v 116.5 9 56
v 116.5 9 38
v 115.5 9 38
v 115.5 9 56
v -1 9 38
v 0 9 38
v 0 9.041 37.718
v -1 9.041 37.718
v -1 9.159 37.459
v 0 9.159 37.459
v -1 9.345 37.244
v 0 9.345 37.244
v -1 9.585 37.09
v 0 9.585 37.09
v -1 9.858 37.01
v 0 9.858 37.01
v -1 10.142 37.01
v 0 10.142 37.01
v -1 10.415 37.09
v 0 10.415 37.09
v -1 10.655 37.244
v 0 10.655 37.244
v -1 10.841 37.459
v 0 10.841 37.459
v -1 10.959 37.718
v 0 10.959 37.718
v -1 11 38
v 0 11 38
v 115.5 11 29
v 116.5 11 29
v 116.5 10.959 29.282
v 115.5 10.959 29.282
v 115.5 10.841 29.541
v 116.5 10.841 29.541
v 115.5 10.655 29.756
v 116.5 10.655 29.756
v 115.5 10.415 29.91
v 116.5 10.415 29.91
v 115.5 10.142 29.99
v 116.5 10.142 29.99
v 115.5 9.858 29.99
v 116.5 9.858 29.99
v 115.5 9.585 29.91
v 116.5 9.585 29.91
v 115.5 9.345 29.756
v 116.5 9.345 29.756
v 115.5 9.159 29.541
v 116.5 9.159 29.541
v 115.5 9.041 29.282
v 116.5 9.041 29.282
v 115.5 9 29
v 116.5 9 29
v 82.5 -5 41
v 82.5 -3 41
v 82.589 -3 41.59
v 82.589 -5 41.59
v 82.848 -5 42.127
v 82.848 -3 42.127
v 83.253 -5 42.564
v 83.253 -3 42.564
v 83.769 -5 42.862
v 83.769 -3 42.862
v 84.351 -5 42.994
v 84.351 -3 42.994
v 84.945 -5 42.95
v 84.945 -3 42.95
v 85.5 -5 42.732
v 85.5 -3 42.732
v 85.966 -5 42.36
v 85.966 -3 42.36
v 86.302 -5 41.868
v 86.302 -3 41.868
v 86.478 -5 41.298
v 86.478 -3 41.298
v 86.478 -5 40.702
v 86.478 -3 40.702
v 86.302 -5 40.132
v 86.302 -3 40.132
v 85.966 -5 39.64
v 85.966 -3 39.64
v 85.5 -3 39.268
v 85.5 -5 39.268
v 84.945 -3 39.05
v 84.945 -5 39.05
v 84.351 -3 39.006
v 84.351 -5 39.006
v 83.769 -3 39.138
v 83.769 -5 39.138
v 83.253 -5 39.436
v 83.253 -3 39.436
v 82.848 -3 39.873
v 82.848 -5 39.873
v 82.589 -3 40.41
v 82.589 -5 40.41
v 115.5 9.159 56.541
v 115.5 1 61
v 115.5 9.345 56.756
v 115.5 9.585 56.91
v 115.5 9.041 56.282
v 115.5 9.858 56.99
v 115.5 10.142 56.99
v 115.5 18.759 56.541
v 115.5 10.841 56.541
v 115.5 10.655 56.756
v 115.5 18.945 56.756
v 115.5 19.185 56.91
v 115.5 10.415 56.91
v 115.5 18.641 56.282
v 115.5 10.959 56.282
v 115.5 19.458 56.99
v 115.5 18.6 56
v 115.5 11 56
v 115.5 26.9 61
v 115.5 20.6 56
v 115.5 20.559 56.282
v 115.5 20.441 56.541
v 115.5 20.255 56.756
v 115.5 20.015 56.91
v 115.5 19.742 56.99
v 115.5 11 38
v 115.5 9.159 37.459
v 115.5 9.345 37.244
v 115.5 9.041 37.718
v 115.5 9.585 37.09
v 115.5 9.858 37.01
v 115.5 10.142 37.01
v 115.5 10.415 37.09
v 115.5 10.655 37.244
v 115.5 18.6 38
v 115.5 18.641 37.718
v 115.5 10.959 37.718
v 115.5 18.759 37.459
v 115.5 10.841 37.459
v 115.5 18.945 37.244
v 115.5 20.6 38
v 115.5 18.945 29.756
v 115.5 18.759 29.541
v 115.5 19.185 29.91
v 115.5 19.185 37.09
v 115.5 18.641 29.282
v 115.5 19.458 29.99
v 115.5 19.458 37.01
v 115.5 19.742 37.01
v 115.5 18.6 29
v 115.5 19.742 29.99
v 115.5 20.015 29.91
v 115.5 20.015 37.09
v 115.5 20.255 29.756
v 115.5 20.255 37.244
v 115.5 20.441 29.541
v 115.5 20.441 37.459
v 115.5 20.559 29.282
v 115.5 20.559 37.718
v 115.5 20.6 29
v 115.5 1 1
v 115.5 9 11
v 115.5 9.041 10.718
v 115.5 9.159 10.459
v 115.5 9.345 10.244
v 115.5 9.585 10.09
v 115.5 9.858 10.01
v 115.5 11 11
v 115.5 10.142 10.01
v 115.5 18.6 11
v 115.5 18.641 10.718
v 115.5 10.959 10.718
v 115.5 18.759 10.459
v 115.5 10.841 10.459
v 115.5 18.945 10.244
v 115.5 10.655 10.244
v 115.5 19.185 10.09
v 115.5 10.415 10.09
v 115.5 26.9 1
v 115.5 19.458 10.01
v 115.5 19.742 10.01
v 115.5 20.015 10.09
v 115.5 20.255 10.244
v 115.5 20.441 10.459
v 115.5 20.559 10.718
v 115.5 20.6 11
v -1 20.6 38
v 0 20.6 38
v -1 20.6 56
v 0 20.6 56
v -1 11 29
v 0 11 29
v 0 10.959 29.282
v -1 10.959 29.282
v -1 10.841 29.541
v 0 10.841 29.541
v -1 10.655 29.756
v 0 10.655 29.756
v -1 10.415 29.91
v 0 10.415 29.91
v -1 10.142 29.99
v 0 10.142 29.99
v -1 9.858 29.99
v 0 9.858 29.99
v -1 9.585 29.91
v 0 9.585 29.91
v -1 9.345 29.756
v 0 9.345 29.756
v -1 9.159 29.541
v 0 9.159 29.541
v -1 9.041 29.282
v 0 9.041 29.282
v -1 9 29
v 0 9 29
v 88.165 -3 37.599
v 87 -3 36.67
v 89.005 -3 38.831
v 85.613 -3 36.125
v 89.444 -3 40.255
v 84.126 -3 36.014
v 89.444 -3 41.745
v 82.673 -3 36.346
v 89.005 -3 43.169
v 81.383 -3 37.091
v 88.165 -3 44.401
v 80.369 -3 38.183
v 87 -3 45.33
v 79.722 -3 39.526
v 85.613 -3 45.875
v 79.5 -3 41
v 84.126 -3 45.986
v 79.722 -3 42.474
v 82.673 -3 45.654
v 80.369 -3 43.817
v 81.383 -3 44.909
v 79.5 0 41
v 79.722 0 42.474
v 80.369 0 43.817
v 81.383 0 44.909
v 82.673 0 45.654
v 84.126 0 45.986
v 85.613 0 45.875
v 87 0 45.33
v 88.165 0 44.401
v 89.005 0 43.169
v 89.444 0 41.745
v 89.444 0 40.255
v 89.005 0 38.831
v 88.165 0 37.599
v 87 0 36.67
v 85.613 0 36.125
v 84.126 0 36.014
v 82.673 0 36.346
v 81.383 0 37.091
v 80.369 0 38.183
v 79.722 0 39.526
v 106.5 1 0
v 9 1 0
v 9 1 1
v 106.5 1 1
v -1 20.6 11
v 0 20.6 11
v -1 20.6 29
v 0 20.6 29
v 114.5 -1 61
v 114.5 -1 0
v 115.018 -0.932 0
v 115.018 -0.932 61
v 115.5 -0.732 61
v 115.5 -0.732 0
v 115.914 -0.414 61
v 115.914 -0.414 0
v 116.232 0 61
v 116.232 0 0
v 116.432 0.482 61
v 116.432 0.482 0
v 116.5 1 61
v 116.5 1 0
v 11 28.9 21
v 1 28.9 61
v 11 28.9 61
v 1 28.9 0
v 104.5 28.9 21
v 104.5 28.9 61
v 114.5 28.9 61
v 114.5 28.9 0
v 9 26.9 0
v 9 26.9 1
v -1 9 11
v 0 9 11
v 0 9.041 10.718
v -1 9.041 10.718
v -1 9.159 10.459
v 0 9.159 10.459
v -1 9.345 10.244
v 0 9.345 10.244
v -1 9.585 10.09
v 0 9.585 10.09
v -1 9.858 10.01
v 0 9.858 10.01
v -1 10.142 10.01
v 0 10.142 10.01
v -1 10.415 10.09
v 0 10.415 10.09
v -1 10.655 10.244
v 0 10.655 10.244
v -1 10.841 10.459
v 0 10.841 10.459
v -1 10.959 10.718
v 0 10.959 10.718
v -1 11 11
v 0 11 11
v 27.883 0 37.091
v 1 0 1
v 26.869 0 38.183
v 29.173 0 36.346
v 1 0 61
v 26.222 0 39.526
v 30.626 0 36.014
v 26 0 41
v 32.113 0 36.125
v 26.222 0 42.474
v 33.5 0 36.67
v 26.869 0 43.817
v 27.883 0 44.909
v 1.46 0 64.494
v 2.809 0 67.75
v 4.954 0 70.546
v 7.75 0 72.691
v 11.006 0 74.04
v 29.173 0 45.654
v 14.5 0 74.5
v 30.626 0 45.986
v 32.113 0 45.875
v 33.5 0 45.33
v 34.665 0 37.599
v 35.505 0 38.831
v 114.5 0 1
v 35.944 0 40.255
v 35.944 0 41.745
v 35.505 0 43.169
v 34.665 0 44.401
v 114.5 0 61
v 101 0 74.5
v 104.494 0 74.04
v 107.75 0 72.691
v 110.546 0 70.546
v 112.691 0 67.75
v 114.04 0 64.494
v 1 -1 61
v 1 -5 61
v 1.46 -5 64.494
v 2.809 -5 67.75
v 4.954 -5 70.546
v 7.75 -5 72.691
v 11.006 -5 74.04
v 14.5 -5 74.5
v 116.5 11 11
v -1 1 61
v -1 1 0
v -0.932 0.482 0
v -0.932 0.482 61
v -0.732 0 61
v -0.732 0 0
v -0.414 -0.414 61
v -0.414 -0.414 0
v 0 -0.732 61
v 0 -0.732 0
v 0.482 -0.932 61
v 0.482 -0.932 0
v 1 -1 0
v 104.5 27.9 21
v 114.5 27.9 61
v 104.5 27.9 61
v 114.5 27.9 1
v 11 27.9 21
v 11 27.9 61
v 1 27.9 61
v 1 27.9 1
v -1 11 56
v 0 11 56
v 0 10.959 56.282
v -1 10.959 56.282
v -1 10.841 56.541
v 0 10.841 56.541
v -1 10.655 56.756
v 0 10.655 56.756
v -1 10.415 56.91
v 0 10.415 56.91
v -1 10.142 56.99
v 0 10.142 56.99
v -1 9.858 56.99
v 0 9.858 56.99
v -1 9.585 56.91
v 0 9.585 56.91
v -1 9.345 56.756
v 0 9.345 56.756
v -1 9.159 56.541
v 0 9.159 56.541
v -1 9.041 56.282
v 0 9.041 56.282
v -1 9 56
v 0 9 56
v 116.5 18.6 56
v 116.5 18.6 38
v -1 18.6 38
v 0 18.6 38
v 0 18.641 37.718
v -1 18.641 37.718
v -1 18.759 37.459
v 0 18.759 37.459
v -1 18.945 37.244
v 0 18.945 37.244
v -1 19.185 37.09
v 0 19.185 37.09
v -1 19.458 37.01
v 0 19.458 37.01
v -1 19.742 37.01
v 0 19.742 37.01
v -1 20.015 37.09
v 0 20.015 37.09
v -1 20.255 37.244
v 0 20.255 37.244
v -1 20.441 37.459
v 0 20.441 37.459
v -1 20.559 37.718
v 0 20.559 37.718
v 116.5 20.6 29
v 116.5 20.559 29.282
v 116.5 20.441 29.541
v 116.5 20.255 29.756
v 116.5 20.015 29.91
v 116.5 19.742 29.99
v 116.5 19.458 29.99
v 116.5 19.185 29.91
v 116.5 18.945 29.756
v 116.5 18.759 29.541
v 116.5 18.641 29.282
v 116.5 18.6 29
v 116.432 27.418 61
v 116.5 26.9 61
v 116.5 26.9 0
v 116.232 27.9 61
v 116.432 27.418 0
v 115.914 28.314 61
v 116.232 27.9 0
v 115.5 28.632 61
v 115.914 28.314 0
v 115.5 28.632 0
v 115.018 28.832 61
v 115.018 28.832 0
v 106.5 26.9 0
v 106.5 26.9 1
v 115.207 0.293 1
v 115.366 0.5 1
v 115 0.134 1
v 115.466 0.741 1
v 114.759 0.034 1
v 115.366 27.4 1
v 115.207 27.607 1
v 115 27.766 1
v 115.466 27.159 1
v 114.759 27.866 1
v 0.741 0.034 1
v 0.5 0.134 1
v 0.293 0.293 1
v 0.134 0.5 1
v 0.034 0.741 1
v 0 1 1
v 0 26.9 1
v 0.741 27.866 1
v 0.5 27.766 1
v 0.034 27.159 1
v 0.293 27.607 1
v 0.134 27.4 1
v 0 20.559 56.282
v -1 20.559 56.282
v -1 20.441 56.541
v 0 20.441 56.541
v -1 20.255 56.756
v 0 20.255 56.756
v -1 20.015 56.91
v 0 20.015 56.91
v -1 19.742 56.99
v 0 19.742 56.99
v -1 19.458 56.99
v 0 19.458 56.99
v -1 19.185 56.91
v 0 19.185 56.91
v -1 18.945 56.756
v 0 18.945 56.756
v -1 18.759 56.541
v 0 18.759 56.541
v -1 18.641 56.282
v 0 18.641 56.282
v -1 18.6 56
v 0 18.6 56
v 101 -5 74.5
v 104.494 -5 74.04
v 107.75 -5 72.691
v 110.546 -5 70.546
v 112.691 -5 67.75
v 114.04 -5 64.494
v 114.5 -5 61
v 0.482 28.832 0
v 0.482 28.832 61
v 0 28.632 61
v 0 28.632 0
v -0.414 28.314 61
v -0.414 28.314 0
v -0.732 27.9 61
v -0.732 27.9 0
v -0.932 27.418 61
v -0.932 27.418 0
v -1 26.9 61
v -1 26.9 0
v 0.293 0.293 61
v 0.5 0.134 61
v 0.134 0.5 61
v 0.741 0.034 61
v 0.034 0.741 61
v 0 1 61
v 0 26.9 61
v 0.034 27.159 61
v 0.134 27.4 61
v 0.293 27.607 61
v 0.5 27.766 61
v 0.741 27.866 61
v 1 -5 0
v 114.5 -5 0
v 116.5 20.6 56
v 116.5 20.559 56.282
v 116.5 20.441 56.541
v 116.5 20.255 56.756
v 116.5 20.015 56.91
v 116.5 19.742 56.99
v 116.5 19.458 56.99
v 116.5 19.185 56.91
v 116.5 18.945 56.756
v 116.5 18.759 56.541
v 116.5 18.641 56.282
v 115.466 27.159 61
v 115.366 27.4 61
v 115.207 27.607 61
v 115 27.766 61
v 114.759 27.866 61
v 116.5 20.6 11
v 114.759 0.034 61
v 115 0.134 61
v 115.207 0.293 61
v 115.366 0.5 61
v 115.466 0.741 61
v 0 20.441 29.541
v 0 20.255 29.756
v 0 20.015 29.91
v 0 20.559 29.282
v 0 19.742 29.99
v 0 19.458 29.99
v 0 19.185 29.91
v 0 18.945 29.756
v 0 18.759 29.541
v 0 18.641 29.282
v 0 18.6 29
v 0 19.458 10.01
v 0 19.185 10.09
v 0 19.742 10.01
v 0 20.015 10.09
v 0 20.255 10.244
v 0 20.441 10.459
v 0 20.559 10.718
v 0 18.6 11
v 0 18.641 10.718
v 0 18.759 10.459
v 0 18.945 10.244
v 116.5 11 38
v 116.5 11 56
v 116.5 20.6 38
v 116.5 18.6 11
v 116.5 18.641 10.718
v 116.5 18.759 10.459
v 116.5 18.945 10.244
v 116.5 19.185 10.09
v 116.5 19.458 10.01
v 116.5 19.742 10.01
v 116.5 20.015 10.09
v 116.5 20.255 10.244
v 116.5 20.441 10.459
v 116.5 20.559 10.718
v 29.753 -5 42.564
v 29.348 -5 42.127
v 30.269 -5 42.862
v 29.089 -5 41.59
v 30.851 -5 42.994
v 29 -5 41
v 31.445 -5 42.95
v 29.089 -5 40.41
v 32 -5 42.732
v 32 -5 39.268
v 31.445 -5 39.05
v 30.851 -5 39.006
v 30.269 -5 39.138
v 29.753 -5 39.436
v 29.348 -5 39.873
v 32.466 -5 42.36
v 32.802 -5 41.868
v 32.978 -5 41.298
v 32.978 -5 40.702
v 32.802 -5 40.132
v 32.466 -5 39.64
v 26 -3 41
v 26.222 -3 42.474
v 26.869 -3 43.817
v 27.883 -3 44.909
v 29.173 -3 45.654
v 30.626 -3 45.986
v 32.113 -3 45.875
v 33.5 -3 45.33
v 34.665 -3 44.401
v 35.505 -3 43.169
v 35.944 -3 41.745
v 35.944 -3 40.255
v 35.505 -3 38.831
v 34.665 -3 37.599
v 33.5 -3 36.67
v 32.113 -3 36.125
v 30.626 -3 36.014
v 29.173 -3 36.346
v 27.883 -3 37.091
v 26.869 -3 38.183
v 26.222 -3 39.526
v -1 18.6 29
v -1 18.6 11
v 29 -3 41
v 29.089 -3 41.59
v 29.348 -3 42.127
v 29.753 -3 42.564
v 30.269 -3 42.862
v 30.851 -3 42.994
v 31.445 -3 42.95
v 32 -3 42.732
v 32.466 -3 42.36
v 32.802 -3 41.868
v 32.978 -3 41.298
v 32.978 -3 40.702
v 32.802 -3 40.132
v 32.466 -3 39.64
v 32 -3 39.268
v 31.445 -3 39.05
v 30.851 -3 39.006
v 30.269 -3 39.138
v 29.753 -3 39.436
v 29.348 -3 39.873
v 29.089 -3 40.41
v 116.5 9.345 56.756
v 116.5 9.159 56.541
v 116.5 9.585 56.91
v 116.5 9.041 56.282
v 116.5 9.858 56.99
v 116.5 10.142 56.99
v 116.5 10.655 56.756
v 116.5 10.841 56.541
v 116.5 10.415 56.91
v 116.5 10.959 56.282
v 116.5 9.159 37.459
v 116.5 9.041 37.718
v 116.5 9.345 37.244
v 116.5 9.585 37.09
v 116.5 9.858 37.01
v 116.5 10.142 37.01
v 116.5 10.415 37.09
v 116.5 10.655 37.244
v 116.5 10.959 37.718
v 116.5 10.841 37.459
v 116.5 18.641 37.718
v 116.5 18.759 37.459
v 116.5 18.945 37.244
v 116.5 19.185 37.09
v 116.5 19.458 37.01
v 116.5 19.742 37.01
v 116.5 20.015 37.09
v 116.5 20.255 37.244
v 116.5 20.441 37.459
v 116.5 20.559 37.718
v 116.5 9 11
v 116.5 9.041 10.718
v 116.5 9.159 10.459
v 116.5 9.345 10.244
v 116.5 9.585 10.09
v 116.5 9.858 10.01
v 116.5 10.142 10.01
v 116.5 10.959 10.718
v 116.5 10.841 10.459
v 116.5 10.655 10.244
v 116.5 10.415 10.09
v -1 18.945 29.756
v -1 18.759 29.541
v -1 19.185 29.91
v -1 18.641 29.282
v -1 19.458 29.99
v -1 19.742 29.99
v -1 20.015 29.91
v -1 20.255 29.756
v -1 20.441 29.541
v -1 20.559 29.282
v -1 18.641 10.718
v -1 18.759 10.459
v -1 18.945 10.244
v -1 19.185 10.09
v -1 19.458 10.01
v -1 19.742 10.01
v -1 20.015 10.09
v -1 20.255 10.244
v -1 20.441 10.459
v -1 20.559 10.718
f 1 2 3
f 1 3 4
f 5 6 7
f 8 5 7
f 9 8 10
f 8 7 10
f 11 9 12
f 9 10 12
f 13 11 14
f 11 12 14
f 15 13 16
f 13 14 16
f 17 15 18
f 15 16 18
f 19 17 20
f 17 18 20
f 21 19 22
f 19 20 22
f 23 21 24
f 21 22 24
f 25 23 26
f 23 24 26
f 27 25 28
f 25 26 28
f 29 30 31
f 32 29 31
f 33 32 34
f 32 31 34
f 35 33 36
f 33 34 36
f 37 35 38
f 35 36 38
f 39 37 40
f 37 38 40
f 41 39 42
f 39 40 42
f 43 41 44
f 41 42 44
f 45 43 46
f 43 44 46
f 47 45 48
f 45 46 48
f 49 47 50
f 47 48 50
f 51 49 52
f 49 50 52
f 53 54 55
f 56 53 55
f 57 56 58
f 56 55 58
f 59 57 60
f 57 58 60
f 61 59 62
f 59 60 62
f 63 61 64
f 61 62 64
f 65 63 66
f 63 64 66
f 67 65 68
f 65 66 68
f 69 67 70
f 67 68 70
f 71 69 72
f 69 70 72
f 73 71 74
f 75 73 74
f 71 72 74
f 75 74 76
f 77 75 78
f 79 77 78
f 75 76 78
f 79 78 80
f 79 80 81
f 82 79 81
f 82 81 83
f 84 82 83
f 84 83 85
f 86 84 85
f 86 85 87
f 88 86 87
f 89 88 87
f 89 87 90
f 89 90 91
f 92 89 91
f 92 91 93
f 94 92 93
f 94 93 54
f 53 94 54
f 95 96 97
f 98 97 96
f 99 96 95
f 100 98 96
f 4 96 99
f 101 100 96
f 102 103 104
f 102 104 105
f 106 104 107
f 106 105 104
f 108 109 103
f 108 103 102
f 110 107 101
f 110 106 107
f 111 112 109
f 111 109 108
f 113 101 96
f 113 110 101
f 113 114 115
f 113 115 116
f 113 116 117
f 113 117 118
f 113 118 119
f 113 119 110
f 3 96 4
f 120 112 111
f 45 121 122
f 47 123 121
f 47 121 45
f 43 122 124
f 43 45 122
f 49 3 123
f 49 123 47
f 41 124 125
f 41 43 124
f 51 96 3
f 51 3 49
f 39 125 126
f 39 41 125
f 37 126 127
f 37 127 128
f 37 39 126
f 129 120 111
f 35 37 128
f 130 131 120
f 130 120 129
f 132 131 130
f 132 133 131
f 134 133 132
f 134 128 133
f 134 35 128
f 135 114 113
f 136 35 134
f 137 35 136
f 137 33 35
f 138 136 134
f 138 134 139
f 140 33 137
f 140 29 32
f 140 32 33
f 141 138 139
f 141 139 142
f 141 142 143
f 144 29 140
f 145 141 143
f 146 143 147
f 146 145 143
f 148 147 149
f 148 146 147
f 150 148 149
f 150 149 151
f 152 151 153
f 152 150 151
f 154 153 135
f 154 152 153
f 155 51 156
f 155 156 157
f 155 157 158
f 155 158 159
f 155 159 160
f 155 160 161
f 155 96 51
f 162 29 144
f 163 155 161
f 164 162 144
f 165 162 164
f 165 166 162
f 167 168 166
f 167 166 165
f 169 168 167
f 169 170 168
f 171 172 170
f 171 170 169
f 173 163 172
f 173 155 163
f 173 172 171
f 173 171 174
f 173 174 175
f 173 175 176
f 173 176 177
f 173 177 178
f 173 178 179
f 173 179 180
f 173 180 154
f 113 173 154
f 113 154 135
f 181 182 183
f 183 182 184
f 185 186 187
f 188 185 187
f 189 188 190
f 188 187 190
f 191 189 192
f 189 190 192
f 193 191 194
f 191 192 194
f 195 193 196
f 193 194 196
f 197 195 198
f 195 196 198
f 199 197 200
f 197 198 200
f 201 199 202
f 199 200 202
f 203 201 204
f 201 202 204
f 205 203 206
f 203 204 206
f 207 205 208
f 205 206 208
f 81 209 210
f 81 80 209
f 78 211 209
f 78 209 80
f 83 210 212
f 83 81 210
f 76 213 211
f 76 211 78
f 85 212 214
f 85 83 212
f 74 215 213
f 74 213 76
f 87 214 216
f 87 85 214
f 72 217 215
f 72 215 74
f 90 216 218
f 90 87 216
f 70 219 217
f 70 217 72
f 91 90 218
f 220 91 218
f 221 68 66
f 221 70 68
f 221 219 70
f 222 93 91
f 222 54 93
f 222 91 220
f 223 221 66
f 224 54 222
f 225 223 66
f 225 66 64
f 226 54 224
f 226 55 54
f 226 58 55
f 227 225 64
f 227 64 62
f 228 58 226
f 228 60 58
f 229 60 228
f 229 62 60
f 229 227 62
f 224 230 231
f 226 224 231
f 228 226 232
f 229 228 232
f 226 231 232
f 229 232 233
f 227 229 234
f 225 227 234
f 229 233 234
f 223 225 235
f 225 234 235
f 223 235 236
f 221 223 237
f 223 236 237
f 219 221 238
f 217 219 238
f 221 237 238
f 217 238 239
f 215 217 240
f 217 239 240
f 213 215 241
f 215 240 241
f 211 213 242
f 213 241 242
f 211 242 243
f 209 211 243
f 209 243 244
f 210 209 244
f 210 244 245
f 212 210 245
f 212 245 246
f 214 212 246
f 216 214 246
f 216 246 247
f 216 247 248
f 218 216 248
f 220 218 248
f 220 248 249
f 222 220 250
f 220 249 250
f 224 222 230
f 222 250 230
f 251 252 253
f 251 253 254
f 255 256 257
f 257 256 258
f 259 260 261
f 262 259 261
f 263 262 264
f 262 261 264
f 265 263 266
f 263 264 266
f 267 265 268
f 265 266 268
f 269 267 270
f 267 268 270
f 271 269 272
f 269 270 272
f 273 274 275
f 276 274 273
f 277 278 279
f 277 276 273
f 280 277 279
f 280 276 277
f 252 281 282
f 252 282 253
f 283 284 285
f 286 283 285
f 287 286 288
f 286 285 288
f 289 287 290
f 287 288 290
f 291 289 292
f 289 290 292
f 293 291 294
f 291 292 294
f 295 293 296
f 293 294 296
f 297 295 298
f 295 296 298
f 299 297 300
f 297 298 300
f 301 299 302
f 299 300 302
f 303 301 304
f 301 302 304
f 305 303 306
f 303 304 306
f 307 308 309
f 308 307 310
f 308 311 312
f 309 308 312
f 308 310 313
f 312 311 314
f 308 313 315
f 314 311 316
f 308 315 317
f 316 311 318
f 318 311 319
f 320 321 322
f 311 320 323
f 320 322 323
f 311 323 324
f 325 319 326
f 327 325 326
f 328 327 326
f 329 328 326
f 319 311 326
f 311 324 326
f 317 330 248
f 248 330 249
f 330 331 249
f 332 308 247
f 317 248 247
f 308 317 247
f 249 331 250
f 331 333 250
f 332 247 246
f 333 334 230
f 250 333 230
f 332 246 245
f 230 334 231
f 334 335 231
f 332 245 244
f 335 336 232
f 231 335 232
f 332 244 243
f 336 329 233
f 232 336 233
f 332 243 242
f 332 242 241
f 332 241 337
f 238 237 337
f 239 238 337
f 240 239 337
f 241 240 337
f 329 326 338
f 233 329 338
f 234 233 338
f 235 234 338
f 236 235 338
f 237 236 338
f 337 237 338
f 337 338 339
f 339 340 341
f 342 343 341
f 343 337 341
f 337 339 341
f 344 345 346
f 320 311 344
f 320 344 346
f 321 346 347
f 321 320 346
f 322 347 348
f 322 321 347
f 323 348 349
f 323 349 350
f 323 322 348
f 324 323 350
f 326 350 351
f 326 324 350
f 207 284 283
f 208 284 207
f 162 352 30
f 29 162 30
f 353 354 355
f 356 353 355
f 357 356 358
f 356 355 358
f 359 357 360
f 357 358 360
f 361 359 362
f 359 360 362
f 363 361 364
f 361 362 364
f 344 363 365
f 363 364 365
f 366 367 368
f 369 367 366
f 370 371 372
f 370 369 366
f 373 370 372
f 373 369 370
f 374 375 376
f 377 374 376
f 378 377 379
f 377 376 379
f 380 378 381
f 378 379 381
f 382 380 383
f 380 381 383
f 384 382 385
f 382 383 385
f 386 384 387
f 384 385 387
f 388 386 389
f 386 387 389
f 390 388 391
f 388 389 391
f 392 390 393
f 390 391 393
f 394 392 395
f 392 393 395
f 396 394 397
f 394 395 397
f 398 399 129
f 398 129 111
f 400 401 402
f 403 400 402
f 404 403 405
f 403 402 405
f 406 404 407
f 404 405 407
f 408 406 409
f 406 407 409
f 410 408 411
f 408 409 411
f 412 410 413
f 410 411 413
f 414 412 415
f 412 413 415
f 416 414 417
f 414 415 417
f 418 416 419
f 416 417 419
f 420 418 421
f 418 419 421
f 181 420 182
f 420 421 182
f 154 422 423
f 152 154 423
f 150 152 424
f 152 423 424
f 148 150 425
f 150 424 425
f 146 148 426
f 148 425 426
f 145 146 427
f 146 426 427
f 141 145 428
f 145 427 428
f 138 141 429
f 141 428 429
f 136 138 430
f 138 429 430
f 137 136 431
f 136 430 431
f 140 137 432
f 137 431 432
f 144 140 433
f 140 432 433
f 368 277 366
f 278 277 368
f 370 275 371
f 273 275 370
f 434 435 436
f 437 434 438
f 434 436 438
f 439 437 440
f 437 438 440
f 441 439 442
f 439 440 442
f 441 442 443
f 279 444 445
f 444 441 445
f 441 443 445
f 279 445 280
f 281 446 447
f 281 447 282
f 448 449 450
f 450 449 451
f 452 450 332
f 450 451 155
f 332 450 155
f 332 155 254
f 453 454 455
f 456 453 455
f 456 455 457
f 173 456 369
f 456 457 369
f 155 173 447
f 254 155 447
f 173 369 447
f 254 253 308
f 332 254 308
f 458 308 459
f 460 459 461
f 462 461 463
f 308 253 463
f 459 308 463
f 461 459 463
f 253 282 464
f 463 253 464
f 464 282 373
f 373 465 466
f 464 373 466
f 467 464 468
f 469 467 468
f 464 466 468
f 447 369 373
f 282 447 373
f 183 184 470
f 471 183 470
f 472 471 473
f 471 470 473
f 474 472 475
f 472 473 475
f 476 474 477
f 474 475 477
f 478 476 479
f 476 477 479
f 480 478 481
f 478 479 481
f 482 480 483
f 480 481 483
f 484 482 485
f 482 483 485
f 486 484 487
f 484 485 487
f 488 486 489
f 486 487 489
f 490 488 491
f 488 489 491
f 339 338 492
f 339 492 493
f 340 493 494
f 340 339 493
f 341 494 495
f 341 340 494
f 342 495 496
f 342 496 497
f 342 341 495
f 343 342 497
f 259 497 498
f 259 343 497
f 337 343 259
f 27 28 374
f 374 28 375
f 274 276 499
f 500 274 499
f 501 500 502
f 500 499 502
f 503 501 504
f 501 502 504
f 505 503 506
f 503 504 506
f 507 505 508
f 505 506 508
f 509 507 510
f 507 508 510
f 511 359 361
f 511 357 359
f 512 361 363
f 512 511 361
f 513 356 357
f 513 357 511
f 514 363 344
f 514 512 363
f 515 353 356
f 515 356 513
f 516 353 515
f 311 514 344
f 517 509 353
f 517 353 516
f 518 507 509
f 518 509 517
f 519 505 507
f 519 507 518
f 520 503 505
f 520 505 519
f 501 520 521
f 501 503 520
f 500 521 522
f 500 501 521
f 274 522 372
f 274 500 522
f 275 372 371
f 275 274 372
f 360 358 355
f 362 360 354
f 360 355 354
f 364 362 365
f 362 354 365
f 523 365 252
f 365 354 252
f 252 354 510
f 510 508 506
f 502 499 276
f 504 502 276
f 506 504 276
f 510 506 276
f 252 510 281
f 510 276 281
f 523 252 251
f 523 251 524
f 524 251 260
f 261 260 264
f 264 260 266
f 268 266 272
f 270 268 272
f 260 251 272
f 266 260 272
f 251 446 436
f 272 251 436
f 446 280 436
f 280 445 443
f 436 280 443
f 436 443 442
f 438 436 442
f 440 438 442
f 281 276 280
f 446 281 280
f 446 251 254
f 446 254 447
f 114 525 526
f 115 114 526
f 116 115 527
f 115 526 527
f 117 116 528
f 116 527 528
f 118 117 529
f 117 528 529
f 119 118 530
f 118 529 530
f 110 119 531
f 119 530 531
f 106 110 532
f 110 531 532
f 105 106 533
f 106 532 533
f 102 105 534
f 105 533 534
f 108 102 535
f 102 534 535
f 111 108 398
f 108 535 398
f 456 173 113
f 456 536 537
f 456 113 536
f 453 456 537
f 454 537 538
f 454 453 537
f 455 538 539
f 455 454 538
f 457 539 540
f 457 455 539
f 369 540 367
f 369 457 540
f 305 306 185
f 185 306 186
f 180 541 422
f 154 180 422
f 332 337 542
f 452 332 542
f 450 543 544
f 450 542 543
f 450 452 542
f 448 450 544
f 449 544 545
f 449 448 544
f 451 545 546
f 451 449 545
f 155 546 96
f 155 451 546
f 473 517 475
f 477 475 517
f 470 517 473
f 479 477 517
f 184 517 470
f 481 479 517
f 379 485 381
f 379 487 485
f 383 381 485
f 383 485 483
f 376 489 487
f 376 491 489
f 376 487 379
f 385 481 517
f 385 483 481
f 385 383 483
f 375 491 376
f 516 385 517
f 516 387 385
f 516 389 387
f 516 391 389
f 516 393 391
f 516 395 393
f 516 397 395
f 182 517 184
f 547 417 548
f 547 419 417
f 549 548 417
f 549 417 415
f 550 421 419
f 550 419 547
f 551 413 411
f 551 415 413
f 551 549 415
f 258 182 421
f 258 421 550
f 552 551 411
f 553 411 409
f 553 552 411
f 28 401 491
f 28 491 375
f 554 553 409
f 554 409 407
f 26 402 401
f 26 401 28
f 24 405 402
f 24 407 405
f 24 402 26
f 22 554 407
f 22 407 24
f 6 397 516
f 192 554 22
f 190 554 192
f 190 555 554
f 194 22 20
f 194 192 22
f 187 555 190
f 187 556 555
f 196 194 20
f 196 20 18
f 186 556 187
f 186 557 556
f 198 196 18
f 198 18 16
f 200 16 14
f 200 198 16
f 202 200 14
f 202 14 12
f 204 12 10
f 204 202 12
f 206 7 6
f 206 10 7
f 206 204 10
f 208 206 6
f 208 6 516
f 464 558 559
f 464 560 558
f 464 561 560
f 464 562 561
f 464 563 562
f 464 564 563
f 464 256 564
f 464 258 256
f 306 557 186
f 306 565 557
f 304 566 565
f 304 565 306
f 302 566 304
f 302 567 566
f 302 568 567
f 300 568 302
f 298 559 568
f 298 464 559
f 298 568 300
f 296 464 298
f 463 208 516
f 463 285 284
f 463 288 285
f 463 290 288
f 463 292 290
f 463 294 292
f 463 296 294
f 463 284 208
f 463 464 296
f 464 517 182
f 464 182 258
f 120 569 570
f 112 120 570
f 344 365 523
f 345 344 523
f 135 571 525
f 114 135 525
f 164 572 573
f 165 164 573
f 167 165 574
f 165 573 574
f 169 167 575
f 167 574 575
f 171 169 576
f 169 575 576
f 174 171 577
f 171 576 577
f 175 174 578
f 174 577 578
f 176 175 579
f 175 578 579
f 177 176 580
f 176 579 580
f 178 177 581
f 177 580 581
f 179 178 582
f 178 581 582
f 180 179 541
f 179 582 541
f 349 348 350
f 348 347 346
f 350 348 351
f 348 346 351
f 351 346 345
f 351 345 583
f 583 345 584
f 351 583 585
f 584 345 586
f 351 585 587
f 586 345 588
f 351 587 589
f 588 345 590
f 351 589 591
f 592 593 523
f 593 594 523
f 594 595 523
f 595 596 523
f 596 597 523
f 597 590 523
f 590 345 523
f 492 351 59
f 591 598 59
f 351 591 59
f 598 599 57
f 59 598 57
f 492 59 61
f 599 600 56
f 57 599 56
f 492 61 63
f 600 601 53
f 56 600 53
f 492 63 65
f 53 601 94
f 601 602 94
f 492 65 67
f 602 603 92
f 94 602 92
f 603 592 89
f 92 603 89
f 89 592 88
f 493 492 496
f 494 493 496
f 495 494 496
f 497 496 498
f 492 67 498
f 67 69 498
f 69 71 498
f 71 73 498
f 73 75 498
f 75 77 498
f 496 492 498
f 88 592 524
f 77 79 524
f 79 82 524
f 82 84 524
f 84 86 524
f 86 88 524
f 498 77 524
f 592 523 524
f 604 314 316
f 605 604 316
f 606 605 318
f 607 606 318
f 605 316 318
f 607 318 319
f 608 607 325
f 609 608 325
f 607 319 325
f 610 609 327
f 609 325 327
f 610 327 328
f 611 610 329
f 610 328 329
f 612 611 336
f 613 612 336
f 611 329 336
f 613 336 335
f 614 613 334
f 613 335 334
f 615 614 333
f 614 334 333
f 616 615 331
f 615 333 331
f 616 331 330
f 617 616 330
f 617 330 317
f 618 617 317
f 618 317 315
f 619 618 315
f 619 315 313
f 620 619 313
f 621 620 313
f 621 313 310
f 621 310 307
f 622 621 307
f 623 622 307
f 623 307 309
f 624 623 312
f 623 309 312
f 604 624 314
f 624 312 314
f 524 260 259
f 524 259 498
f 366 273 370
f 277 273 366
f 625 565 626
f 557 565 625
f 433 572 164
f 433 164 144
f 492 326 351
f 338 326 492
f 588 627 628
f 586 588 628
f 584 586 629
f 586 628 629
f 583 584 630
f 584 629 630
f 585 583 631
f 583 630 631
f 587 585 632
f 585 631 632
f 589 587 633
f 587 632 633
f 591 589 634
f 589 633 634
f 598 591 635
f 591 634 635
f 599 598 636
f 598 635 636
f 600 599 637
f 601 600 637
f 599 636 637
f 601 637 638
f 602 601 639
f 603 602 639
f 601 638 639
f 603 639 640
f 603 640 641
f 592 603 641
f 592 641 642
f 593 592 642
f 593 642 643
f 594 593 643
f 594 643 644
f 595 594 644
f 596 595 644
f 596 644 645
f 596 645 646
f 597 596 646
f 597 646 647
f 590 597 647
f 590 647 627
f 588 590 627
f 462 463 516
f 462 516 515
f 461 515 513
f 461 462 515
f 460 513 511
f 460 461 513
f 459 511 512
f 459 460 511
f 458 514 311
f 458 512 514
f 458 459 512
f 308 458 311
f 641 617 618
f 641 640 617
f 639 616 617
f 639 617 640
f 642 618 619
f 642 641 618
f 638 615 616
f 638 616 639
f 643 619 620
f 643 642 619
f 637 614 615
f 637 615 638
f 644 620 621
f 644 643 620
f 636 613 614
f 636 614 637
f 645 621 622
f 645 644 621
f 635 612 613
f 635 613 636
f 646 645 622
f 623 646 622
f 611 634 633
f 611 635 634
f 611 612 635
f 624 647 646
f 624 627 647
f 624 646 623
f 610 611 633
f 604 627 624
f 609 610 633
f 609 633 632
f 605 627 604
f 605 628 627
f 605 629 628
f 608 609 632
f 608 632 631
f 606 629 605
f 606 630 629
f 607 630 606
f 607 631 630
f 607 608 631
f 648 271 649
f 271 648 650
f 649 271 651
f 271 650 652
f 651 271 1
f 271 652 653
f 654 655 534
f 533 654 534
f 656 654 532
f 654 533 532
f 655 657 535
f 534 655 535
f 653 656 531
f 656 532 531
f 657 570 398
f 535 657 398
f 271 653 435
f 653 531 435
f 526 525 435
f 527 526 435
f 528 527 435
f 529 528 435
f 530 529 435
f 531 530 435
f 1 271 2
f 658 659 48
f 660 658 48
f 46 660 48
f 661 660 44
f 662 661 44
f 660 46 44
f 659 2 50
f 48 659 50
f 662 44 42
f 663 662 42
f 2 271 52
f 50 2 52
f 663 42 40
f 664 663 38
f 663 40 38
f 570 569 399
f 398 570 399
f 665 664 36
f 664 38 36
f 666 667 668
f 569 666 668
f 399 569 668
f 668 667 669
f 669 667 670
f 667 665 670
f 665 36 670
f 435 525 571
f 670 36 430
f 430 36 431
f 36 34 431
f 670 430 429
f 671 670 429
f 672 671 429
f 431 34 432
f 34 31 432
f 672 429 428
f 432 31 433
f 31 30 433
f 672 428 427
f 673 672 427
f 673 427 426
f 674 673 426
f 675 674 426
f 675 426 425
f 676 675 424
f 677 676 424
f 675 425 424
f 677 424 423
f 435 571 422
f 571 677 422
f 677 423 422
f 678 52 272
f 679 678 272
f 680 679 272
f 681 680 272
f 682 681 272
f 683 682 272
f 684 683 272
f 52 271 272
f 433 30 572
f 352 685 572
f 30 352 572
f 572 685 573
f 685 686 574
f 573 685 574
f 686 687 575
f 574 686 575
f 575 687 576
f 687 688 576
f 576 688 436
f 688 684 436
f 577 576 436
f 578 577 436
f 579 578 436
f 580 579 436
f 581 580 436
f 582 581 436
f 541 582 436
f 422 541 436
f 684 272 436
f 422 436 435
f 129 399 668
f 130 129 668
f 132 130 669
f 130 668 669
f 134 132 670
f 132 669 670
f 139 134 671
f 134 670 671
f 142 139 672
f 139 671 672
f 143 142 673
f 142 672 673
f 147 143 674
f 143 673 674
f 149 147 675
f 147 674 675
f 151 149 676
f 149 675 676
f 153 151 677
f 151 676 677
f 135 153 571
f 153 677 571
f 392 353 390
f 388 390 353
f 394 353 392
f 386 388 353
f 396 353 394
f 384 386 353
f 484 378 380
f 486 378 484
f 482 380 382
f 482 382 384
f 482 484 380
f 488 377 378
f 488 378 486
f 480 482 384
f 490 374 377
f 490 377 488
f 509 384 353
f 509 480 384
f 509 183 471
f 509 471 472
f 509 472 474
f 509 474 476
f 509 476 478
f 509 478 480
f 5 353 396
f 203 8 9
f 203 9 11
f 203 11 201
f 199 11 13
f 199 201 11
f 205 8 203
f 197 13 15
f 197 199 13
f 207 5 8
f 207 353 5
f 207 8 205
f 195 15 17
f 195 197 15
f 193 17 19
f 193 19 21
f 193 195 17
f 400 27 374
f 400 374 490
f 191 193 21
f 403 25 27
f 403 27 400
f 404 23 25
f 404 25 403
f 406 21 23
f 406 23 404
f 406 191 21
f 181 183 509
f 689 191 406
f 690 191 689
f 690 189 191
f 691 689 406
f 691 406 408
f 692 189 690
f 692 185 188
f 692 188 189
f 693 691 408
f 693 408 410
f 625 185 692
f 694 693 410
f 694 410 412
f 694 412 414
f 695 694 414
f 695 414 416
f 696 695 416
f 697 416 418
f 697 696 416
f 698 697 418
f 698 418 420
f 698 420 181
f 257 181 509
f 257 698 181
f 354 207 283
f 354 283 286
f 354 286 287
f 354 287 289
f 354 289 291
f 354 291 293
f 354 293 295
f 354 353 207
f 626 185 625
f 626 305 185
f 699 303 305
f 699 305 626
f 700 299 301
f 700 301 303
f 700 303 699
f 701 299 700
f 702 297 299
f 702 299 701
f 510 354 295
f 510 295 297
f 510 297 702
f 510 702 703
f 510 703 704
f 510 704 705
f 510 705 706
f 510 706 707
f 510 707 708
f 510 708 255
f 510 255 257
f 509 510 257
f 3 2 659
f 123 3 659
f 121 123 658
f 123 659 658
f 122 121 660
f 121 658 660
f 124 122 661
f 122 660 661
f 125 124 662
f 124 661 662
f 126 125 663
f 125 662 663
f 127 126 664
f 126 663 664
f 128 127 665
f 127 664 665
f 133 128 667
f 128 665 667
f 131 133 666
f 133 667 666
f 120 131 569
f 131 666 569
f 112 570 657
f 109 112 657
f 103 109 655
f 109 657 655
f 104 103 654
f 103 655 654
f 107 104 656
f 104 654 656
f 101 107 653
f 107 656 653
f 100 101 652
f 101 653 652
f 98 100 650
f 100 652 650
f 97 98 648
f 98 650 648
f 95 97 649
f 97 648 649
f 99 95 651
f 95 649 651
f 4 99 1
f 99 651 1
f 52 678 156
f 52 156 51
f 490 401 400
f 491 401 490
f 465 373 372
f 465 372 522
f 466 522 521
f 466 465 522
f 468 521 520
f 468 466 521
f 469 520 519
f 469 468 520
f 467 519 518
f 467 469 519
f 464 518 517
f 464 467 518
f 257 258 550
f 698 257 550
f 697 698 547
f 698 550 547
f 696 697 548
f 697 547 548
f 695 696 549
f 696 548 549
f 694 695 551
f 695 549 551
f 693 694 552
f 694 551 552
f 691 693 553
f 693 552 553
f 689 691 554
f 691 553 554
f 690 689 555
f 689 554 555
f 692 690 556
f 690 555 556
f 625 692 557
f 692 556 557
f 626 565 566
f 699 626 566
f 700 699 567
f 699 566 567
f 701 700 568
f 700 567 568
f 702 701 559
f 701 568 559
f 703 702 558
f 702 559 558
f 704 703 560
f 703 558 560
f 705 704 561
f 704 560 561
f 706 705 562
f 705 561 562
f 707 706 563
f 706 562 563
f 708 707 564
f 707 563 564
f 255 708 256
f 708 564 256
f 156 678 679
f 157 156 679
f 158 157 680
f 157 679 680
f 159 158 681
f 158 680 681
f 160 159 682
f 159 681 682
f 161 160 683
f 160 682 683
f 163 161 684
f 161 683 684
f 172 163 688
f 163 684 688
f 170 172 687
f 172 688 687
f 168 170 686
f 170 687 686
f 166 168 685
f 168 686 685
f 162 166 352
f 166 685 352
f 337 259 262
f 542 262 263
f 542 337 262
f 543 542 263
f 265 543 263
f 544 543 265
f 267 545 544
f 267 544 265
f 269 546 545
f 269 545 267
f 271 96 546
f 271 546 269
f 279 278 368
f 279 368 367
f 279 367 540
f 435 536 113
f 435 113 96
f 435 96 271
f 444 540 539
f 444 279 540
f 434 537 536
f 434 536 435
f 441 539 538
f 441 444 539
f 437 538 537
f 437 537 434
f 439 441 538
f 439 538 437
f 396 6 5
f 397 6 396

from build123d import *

# Parameters (mm, degrees)
PAD_DEPTH       = 74.5
PAD001_DEPTH    = 1
POCKET_DEPTH    = 28.9
POCKET001_DEPTH = 5.001
SKETCH004_R     = 5
POCKET002_DEPTH = 3
SKETCH005_R     = 2
HOLE_DEPTH      = 25
POCKET003_DEPTH = 117.501


with BuildPart() as part:
    # Sketch → Pad (new body)
    with BuildSketch(Plane.XY):
        with BuildLine():
            Line((1, -1), (1, -5))
            Line((1, -5), (114.5, -5))
            Line((114.5, -1), (114.5, -5))
            ThreePointArc((114.5, -1), (115.914212, -0.414215), (116.5, 0.999995))
            Line((116.5, 0.999995), (116.5, 26.9))
            ThreePointArc((116.5, 26.9), (115.914214, 28.314214), (114.5, 28.9))
            Line((1, 28.9), (114.5, 28.9))
            ThreePointArc((1, 28.9), (-0.414214, 28.314214), (-1, 26.9))
            Line((-1, 1), (-1, 26.9))
            ThreePointArc((-1, 1), (-0.414214, -0.414214), (1, -1))
        make_face()
        with BuildLine():
            Line((1, 0), (114.5, 0))
            ThreePointArc((114.5, 0), (115.207107, 0.292893), (115.5, 1))
            Line((115.5, 1), (115.5, 26.9))
            ThreePointArc((115.5, 26.9), (115.207107, 27.607107), (114.5, 27.9))
            Line((114.5, 27.9), (1, 27.9))
            ThreePointArc((1, 27.9), (0.292893, 27.607107), (0, 26.9))
            Line((0, 26.9), (0, 1))
            ThreePointArc((0, 1), (0.292893, 0.292893), (1, 0))
        make_face(mode=Mode.SUBTRACT)
    extrude(amount=PAD_DEPTH)

    # Sketch001 → Pad001 (join)
    with BuildSketch(Plane.XY):
        with BuildLine():
            Line((-1, 1), (-1, 26.9))
            ThreePointArc((1, 28.9), (-0.414214, 28.314214), (-1, 26.9))
            Line((1, 28.9), (114.5, 28.9))
            ThreePointArc((116.5, 26.9), (115.914214, 28.314214), (114.5, 28.9))
            Line((116.5, 26.9), (116.5, 0.999995))
            ThreePointArc((114.5, -1), (115.914212, -0.414215), (116.5, 0.999995))
            Line((114.5, -1), (114.5, -5))
            Line((114.5, -5), (1, -5))
            Line((1, -5), (1, -1))
            ThreePointArc((-1, 1), (-0.414214, -0.414214), (1, -1))
        make_face()
        Polygon((9, 26.9), (9, 1), (106.5, 0.999995), (106.5, 26.9), align=None, mode=Mode.SUBTRACT)
    extrude(amount=PAD001_DEPTH)

    # Sketch002 (on Face22 of Pad001) → Pocket (cut)
    with BuildSketch(Plane(origin=(0, 28.9, 0), x_dir=(-1, 0, 0), z_dir=(0, 1, 0))):
        Polygon((-104.5, 21), (-104.5, 61), (-124.5, 61), (-124.5, 74.5), (9, 74.5), (9, 61), (-11, 61), (-11, 21), align=None)
    extrude(amount=-POCKET_DEPTH, mode=Mode.SUBTRACT)

    # Sketch003 (on Face30 of Pocket) → Pocket001 (cut, through all)
    with BuildSketch(Plane(origin=(0, 0, 0), x_dir=(-1, 0, 0), z_dir=(0, 1, 0))):
        with BuildLine():
            ThreePointArc((-101, 74.5), (-110.545942, 70.545942), (-114.5, 61))
            Line((-114.5, 61), (-124.5, 61))
            Line((-124.5, 61), (-124.5, 74.5))
            Line((-124.5, 74.5), (-101, 74.5))
        make_face()
        with BuildLine():
            ThreePointArc((-1, 61), (-4.954058, 70.545942), (-14.5, 74.5))
            Line((-14.5, 74.5), (9, 74.5))
            Line((9, 74.5), (9, 61))
            Line((9, 61), (-1, 61))
        make_face()
    extrude(amount=-POCKET001_DEPTH, mode=Mode.SUBTRACT)

    # Sketch004 (on Face42 of Pocket001) → Pocket002 (cut)
    with BuildSketch(Plane(origin=(0, 0, 0), x_dir=(-1, 0, 0), z_dir=(0, 1, 0))):
        with Locations((-84.5, 41)):
            Circle(SKETCH004_R)
        with Locations((-31, 41)):
            Circle(SKETCH004_R)
    extrude(amount=-POCKET002_DEPTH, mode=Mode.SUBTRACT)

    # Sketch005 (on Face42 of Pocket001) → Hole (cut)
    with BuildSketch(Plane(origin=(0, 0, 0), x_dir=(-1, 0, 0), z_dir=(0, 1, 0))):
        with Locations((-84.5, 41)):
            Circle(SKETCH005_R)
        with Locations((-31, 41)):
            Circle(SKETCH005_R)
    extrude(amount=-HOLE_DEPTH, mode=Mode.SUBTRACT)

    # Sketch006 (on Face21 of Hole) → Pocket003 (cut, through all)
    with BuildSketch(Plane.YZ.offset(116.5)):
        with BuildLine():
            ThreePointArc((9, 11), (10, 10), (11, 11))
            Line((11, 11), (11, 29))
            ThreePointArc((11, 29), (10, 30), (9, 29))
            Line((9, 11), (9, 29))
        make_face()
        with BuildLine():
            ThreePointArc((9, 38), (10, 37), (11, 38))
            Line((11, 38), (11, 56))
            ThreePointArc((11, 56), (10, 57), (9, 56))
            Line((9, 38), (9, 56))
        make_face()
        with BuildLine():
            ThreePointArc((18.6, 11), (19.6, 10), (20.6, 11))
            Line((20.6, 11), (20.6, 29))
            ThreePointArc((20.6, 29), (19.6, 30), (18.6, 29))
            Line((18.6, 11), (18.6, 29))
        make_face()
        with BuildLine():
            ThreePointArc((18.6, 38), (19.6, 37), (20.6, 38))
            Line((20.6, 38), (20.6, 56))
            ThreePointArc((20.6, 56), (19.6, 57), (18.6, 56))
            Line((18.6, 38), (18.6, 56))
        make_face()
    extrude(amount=-POCKET003_DEPTH, mode=Mode.SUBTRACT)


solid = part.part
